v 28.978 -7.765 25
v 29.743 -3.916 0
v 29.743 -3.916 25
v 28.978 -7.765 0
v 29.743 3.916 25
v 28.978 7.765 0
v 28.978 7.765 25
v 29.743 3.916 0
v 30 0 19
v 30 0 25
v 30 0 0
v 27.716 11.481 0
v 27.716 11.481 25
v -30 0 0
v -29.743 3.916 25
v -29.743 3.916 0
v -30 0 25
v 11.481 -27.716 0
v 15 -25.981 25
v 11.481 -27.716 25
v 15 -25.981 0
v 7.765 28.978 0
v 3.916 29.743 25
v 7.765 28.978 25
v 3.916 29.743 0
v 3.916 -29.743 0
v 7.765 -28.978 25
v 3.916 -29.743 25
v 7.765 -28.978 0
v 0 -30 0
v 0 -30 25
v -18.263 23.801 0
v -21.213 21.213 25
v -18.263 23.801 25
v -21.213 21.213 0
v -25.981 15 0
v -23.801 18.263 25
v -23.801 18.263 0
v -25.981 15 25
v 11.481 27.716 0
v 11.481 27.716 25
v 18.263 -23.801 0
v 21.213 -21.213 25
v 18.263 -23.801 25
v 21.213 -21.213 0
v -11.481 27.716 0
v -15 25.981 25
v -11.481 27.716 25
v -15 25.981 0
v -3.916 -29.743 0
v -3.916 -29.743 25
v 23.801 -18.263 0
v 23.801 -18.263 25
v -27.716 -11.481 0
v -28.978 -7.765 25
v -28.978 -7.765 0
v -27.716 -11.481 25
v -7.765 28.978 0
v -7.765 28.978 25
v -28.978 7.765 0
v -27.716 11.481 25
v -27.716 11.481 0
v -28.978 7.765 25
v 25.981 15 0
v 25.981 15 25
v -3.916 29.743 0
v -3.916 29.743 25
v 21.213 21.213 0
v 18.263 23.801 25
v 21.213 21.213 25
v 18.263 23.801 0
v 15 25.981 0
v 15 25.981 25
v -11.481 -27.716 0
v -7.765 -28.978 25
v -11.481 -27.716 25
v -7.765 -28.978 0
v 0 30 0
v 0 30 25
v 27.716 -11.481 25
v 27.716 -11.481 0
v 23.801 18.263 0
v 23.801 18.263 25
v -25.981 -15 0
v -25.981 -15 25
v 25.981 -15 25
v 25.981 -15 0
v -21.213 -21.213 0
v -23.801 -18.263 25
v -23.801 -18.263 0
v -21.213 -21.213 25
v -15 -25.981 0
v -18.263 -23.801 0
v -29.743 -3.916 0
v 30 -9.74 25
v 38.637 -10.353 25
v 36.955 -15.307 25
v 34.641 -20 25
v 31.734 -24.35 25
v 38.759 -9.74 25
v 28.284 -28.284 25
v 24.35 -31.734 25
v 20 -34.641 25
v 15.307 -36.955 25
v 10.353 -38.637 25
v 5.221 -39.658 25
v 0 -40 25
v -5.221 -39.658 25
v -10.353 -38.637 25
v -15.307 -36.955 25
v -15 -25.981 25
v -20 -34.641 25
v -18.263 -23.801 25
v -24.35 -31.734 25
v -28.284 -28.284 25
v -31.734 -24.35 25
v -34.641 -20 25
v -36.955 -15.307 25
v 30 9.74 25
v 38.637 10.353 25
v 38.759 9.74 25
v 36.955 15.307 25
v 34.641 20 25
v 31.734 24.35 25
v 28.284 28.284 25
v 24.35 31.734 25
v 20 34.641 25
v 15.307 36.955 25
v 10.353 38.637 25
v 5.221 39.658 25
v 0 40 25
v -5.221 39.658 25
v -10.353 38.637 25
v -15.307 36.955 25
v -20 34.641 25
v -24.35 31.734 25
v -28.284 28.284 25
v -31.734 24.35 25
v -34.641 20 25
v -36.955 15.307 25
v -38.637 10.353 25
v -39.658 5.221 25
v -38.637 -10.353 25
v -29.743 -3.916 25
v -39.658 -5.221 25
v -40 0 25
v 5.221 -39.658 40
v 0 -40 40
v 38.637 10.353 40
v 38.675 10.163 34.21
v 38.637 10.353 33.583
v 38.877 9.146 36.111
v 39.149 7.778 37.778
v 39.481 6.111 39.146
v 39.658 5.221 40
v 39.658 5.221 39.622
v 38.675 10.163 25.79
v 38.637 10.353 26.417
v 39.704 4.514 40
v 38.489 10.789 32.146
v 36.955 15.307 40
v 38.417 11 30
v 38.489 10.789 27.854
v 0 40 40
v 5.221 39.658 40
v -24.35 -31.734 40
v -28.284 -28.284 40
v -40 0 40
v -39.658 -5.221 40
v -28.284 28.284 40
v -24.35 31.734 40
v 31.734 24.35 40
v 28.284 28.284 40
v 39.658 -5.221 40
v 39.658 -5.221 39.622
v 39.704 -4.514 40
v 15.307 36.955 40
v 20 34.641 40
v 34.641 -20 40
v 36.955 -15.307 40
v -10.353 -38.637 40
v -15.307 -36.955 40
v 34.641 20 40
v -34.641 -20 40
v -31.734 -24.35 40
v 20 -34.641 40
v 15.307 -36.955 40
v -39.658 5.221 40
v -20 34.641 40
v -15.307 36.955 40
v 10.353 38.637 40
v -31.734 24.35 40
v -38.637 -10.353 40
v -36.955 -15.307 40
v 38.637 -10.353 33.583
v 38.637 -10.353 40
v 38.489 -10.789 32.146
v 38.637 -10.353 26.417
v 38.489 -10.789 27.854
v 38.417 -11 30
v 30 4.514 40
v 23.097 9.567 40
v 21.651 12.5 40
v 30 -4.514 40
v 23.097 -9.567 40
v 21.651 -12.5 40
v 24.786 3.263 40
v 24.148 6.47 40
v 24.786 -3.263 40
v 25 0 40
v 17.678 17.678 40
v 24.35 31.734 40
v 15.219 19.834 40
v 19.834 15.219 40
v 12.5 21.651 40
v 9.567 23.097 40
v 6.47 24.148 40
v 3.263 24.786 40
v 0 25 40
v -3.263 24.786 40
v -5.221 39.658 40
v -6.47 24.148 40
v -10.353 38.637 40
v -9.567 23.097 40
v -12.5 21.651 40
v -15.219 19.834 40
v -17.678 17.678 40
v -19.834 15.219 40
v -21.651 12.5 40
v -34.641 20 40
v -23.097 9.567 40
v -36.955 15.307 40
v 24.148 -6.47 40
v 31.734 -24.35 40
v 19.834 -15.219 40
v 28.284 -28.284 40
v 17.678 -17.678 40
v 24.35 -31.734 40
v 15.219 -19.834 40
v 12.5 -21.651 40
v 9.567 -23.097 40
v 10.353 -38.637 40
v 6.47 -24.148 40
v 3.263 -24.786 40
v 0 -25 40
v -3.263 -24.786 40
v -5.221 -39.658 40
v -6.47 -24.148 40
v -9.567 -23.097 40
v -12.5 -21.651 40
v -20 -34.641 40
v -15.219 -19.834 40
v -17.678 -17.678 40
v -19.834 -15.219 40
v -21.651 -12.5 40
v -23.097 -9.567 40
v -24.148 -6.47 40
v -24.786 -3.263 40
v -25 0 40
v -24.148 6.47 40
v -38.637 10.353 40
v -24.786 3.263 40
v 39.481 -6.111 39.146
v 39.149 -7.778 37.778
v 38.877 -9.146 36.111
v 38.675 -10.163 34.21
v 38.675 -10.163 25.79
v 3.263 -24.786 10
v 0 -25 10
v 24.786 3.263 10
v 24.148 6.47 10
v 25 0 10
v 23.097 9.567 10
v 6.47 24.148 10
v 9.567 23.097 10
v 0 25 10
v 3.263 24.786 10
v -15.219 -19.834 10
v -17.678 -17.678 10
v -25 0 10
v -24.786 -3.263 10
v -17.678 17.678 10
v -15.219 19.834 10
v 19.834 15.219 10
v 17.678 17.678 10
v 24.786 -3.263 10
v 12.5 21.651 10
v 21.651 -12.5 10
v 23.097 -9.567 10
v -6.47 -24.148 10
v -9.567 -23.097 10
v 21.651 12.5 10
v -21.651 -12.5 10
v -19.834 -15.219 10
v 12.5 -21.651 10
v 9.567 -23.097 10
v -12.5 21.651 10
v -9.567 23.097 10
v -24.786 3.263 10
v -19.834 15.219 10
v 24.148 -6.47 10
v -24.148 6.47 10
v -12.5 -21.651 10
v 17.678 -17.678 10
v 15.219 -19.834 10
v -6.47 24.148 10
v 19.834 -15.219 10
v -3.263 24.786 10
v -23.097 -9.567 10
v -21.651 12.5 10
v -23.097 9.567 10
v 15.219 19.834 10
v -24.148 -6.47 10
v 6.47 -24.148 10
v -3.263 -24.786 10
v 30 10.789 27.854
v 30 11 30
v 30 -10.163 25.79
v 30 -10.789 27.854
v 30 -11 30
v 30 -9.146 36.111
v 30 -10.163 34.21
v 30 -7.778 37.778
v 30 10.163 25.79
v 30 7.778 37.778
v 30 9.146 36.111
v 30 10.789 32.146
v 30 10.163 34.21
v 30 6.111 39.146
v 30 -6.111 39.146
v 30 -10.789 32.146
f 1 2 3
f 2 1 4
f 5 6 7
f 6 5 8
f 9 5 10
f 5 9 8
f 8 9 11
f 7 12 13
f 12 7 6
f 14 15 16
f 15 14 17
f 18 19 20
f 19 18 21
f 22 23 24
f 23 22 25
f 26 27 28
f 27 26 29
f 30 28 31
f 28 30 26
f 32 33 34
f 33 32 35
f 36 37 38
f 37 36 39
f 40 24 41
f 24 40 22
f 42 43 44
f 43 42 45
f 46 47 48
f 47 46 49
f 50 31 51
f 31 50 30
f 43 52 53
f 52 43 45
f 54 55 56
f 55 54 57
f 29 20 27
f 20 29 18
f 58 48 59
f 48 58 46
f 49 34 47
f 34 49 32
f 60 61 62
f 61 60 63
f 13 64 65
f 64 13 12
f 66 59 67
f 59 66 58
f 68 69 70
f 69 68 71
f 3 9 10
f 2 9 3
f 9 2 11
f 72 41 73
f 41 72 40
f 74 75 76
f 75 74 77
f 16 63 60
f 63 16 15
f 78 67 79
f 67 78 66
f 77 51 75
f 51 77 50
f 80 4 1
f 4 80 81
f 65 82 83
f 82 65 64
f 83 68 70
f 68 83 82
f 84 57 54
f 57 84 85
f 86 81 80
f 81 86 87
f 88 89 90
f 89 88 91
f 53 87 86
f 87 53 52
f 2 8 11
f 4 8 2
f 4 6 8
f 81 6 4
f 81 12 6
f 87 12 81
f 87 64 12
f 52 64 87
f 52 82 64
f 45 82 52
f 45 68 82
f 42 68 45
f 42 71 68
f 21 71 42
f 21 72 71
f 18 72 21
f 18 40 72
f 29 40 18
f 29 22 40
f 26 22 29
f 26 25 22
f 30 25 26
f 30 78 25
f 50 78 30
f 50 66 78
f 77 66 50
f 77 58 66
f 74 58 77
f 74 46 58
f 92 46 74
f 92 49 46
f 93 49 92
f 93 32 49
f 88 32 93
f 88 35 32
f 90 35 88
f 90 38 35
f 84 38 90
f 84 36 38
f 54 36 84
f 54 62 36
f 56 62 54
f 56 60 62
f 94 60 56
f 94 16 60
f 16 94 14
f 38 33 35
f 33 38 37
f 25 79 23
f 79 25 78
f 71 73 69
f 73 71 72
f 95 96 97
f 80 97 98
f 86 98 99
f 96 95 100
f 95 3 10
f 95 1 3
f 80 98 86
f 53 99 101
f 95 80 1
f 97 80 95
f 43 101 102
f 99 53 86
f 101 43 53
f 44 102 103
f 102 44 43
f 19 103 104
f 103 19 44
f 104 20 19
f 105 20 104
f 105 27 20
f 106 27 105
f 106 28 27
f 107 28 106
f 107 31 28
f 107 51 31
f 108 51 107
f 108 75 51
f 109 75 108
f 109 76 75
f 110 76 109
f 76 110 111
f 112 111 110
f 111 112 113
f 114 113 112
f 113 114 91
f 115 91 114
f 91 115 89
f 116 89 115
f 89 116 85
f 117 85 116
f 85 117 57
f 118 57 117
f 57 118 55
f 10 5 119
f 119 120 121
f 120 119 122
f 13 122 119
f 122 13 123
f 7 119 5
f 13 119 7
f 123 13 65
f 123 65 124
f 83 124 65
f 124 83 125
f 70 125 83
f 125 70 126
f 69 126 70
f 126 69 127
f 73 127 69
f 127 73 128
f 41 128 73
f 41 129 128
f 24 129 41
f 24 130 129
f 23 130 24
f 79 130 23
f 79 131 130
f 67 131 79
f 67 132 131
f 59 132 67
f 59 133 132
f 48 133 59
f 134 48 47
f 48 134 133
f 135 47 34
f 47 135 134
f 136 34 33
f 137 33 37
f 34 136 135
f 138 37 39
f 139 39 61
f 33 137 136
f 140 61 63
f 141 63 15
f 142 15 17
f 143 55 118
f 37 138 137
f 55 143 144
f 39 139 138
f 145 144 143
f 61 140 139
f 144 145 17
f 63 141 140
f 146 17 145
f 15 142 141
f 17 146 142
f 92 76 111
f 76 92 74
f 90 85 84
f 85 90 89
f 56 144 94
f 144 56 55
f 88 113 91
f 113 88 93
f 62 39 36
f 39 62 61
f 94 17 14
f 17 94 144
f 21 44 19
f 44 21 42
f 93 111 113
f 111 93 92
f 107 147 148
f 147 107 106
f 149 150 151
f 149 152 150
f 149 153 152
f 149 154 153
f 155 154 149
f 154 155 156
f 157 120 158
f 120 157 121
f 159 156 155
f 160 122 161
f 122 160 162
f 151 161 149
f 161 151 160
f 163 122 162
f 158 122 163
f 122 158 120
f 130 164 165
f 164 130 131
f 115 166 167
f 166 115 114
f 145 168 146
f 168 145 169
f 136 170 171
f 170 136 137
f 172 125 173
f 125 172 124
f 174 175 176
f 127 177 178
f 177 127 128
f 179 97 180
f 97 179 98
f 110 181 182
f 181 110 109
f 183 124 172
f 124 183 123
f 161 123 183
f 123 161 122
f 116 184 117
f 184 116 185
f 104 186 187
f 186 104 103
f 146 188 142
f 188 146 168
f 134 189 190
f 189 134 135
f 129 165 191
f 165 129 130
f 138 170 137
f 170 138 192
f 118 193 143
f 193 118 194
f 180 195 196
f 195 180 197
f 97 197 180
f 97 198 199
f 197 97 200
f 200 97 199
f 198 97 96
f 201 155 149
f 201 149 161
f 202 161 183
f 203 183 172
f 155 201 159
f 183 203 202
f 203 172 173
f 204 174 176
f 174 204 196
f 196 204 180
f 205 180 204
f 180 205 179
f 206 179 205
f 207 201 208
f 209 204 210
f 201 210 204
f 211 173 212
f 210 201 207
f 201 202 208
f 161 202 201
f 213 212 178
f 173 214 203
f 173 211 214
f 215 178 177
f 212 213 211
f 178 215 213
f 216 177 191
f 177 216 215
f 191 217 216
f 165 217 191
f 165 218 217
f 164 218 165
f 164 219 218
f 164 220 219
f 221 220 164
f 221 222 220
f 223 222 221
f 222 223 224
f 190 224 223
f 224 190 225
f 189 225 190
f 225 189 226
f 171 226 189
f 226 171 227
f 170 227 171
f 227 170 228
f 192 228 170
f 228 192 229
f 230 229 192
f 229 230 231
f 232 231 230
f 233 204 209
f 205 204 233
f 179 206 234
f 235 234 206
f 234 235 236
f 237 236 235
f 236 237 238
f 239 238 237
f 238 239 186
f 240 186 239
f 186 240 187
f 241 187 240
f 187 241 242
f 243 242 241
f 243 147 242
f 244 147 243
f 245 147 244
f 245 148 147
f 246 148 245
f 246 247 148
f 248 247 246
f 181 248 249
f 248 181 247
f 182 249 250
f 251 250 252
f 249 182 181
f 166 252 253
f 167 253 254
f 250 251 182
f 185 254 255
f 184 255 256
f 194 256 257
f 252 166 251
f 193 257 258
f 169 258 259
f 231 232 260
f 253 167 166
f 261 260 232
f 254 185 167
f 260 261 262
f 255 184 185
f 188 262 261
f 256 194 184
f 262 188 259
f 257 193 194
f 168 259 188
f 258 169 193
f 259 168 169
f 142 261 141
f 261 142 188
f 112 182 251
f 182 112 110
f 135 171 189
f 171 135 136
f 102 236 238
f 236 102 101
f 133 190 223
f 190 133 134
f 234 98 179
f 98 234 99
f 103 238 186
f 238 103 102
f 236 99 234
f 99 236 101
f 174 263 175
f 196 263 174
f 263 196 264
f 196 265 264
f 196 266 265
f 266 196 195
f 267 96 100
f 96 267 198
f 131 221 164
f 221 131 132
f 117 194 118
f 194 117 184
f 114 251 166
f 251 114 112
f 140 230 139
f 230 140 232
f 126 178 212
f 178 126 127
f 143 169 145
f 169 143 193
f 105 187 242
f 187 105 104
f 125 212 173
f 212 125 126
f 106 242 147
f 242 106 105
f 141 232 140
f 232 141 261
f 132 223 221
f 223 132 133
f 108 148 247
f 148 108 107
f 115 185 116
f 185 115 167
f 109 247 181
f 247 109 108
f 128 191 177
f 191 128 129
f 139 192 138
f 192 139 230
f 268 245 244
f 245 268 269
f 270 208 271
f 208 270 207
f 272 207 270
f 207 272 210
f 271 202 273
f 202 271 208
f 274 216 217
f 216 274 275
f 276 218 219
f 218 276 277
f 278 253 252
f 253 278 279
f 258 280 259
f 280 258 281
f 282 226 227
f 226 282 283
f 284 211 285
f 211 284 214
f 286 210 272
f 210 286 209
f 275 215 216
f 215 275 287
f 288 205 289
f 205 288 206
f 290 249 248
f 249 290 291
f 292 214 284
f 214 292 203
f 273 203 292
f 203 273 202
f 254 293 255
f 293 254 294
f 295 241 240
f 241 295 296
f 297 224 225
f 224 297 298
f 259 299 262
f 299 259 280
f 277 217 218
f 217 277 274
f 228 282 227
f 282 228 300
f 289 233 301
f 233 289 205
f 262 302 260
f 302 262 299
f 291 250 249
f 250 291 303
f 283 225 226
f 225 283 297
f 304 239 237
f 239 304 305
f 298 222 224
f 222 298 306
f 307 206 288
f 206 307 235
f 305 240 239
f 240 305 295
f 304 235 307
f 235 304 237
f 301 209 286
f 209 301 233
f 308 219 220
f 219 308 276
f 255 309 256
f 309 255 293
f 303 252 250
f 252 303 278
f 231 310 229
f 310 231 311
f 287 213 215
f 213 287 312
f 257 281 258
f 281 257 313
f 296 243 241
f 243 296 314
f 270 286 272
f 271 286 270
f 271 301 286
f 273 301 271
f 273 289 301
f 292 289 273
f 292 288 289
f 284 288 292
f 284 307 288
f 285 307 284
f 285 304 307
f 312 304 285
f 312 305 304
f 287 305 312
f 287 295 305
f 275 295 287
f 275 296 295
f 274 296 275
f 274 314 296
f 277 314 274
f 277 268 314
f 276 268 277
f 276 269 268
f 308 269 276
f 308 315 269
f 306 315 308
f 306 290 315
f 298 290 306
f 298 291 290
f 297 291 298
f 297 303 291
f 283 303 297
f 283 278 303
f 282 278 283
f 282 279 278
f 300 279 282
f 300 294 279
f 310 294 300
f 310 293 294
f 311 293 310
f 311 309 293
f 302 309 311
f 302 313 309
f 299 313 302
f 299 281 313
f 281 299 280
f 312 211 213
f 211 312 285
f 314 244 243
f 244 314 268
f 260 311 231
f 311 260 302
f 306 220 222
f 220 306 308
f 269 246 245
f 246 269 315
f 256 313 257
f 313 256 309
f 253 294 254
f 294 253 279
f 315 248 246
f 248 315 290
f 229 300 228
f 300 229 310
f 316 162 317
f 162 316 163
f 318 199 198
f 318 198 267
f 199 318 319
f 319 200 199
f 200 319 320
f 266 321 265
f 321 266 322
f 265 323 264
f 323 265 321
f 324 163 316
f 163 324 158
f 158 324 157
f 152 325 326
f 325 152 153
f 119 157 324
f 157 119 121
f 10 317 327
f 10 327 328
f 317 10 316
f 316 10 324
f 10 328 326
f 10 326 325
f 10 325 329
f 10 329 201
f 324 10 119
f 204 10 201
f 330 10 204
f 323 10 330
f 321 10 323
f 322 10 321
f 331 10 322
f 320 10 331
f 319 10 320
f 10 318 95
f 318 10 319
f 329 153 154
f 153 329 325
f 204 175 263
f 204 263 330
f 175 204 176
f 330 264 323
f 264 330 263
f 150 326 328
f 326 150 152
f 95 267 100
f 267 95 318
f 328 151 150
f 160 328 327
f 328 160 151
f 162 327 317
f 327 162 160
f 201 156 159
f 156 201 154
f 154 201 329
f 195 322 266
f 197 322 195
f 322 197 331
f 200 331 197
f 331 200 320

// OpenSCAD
// 50 L drum top adapter — feed (low sal)
module feed_tank_adapter() {
  difference() {
  union() {
    cylinder(h=25, d=60, $fn=48);
    translate([0, 0, 25]) cylinder(h=15, d=80, $fn=48);
  }
  translate([0, 0, 10]) cylinder(h=40, d=50, $fn=48);
  translate([30, 0, 30]) rotate([0,90,0]) cylinder(h=40, d=22, $fn=32);
  }
}
feed_tank_adapter();
